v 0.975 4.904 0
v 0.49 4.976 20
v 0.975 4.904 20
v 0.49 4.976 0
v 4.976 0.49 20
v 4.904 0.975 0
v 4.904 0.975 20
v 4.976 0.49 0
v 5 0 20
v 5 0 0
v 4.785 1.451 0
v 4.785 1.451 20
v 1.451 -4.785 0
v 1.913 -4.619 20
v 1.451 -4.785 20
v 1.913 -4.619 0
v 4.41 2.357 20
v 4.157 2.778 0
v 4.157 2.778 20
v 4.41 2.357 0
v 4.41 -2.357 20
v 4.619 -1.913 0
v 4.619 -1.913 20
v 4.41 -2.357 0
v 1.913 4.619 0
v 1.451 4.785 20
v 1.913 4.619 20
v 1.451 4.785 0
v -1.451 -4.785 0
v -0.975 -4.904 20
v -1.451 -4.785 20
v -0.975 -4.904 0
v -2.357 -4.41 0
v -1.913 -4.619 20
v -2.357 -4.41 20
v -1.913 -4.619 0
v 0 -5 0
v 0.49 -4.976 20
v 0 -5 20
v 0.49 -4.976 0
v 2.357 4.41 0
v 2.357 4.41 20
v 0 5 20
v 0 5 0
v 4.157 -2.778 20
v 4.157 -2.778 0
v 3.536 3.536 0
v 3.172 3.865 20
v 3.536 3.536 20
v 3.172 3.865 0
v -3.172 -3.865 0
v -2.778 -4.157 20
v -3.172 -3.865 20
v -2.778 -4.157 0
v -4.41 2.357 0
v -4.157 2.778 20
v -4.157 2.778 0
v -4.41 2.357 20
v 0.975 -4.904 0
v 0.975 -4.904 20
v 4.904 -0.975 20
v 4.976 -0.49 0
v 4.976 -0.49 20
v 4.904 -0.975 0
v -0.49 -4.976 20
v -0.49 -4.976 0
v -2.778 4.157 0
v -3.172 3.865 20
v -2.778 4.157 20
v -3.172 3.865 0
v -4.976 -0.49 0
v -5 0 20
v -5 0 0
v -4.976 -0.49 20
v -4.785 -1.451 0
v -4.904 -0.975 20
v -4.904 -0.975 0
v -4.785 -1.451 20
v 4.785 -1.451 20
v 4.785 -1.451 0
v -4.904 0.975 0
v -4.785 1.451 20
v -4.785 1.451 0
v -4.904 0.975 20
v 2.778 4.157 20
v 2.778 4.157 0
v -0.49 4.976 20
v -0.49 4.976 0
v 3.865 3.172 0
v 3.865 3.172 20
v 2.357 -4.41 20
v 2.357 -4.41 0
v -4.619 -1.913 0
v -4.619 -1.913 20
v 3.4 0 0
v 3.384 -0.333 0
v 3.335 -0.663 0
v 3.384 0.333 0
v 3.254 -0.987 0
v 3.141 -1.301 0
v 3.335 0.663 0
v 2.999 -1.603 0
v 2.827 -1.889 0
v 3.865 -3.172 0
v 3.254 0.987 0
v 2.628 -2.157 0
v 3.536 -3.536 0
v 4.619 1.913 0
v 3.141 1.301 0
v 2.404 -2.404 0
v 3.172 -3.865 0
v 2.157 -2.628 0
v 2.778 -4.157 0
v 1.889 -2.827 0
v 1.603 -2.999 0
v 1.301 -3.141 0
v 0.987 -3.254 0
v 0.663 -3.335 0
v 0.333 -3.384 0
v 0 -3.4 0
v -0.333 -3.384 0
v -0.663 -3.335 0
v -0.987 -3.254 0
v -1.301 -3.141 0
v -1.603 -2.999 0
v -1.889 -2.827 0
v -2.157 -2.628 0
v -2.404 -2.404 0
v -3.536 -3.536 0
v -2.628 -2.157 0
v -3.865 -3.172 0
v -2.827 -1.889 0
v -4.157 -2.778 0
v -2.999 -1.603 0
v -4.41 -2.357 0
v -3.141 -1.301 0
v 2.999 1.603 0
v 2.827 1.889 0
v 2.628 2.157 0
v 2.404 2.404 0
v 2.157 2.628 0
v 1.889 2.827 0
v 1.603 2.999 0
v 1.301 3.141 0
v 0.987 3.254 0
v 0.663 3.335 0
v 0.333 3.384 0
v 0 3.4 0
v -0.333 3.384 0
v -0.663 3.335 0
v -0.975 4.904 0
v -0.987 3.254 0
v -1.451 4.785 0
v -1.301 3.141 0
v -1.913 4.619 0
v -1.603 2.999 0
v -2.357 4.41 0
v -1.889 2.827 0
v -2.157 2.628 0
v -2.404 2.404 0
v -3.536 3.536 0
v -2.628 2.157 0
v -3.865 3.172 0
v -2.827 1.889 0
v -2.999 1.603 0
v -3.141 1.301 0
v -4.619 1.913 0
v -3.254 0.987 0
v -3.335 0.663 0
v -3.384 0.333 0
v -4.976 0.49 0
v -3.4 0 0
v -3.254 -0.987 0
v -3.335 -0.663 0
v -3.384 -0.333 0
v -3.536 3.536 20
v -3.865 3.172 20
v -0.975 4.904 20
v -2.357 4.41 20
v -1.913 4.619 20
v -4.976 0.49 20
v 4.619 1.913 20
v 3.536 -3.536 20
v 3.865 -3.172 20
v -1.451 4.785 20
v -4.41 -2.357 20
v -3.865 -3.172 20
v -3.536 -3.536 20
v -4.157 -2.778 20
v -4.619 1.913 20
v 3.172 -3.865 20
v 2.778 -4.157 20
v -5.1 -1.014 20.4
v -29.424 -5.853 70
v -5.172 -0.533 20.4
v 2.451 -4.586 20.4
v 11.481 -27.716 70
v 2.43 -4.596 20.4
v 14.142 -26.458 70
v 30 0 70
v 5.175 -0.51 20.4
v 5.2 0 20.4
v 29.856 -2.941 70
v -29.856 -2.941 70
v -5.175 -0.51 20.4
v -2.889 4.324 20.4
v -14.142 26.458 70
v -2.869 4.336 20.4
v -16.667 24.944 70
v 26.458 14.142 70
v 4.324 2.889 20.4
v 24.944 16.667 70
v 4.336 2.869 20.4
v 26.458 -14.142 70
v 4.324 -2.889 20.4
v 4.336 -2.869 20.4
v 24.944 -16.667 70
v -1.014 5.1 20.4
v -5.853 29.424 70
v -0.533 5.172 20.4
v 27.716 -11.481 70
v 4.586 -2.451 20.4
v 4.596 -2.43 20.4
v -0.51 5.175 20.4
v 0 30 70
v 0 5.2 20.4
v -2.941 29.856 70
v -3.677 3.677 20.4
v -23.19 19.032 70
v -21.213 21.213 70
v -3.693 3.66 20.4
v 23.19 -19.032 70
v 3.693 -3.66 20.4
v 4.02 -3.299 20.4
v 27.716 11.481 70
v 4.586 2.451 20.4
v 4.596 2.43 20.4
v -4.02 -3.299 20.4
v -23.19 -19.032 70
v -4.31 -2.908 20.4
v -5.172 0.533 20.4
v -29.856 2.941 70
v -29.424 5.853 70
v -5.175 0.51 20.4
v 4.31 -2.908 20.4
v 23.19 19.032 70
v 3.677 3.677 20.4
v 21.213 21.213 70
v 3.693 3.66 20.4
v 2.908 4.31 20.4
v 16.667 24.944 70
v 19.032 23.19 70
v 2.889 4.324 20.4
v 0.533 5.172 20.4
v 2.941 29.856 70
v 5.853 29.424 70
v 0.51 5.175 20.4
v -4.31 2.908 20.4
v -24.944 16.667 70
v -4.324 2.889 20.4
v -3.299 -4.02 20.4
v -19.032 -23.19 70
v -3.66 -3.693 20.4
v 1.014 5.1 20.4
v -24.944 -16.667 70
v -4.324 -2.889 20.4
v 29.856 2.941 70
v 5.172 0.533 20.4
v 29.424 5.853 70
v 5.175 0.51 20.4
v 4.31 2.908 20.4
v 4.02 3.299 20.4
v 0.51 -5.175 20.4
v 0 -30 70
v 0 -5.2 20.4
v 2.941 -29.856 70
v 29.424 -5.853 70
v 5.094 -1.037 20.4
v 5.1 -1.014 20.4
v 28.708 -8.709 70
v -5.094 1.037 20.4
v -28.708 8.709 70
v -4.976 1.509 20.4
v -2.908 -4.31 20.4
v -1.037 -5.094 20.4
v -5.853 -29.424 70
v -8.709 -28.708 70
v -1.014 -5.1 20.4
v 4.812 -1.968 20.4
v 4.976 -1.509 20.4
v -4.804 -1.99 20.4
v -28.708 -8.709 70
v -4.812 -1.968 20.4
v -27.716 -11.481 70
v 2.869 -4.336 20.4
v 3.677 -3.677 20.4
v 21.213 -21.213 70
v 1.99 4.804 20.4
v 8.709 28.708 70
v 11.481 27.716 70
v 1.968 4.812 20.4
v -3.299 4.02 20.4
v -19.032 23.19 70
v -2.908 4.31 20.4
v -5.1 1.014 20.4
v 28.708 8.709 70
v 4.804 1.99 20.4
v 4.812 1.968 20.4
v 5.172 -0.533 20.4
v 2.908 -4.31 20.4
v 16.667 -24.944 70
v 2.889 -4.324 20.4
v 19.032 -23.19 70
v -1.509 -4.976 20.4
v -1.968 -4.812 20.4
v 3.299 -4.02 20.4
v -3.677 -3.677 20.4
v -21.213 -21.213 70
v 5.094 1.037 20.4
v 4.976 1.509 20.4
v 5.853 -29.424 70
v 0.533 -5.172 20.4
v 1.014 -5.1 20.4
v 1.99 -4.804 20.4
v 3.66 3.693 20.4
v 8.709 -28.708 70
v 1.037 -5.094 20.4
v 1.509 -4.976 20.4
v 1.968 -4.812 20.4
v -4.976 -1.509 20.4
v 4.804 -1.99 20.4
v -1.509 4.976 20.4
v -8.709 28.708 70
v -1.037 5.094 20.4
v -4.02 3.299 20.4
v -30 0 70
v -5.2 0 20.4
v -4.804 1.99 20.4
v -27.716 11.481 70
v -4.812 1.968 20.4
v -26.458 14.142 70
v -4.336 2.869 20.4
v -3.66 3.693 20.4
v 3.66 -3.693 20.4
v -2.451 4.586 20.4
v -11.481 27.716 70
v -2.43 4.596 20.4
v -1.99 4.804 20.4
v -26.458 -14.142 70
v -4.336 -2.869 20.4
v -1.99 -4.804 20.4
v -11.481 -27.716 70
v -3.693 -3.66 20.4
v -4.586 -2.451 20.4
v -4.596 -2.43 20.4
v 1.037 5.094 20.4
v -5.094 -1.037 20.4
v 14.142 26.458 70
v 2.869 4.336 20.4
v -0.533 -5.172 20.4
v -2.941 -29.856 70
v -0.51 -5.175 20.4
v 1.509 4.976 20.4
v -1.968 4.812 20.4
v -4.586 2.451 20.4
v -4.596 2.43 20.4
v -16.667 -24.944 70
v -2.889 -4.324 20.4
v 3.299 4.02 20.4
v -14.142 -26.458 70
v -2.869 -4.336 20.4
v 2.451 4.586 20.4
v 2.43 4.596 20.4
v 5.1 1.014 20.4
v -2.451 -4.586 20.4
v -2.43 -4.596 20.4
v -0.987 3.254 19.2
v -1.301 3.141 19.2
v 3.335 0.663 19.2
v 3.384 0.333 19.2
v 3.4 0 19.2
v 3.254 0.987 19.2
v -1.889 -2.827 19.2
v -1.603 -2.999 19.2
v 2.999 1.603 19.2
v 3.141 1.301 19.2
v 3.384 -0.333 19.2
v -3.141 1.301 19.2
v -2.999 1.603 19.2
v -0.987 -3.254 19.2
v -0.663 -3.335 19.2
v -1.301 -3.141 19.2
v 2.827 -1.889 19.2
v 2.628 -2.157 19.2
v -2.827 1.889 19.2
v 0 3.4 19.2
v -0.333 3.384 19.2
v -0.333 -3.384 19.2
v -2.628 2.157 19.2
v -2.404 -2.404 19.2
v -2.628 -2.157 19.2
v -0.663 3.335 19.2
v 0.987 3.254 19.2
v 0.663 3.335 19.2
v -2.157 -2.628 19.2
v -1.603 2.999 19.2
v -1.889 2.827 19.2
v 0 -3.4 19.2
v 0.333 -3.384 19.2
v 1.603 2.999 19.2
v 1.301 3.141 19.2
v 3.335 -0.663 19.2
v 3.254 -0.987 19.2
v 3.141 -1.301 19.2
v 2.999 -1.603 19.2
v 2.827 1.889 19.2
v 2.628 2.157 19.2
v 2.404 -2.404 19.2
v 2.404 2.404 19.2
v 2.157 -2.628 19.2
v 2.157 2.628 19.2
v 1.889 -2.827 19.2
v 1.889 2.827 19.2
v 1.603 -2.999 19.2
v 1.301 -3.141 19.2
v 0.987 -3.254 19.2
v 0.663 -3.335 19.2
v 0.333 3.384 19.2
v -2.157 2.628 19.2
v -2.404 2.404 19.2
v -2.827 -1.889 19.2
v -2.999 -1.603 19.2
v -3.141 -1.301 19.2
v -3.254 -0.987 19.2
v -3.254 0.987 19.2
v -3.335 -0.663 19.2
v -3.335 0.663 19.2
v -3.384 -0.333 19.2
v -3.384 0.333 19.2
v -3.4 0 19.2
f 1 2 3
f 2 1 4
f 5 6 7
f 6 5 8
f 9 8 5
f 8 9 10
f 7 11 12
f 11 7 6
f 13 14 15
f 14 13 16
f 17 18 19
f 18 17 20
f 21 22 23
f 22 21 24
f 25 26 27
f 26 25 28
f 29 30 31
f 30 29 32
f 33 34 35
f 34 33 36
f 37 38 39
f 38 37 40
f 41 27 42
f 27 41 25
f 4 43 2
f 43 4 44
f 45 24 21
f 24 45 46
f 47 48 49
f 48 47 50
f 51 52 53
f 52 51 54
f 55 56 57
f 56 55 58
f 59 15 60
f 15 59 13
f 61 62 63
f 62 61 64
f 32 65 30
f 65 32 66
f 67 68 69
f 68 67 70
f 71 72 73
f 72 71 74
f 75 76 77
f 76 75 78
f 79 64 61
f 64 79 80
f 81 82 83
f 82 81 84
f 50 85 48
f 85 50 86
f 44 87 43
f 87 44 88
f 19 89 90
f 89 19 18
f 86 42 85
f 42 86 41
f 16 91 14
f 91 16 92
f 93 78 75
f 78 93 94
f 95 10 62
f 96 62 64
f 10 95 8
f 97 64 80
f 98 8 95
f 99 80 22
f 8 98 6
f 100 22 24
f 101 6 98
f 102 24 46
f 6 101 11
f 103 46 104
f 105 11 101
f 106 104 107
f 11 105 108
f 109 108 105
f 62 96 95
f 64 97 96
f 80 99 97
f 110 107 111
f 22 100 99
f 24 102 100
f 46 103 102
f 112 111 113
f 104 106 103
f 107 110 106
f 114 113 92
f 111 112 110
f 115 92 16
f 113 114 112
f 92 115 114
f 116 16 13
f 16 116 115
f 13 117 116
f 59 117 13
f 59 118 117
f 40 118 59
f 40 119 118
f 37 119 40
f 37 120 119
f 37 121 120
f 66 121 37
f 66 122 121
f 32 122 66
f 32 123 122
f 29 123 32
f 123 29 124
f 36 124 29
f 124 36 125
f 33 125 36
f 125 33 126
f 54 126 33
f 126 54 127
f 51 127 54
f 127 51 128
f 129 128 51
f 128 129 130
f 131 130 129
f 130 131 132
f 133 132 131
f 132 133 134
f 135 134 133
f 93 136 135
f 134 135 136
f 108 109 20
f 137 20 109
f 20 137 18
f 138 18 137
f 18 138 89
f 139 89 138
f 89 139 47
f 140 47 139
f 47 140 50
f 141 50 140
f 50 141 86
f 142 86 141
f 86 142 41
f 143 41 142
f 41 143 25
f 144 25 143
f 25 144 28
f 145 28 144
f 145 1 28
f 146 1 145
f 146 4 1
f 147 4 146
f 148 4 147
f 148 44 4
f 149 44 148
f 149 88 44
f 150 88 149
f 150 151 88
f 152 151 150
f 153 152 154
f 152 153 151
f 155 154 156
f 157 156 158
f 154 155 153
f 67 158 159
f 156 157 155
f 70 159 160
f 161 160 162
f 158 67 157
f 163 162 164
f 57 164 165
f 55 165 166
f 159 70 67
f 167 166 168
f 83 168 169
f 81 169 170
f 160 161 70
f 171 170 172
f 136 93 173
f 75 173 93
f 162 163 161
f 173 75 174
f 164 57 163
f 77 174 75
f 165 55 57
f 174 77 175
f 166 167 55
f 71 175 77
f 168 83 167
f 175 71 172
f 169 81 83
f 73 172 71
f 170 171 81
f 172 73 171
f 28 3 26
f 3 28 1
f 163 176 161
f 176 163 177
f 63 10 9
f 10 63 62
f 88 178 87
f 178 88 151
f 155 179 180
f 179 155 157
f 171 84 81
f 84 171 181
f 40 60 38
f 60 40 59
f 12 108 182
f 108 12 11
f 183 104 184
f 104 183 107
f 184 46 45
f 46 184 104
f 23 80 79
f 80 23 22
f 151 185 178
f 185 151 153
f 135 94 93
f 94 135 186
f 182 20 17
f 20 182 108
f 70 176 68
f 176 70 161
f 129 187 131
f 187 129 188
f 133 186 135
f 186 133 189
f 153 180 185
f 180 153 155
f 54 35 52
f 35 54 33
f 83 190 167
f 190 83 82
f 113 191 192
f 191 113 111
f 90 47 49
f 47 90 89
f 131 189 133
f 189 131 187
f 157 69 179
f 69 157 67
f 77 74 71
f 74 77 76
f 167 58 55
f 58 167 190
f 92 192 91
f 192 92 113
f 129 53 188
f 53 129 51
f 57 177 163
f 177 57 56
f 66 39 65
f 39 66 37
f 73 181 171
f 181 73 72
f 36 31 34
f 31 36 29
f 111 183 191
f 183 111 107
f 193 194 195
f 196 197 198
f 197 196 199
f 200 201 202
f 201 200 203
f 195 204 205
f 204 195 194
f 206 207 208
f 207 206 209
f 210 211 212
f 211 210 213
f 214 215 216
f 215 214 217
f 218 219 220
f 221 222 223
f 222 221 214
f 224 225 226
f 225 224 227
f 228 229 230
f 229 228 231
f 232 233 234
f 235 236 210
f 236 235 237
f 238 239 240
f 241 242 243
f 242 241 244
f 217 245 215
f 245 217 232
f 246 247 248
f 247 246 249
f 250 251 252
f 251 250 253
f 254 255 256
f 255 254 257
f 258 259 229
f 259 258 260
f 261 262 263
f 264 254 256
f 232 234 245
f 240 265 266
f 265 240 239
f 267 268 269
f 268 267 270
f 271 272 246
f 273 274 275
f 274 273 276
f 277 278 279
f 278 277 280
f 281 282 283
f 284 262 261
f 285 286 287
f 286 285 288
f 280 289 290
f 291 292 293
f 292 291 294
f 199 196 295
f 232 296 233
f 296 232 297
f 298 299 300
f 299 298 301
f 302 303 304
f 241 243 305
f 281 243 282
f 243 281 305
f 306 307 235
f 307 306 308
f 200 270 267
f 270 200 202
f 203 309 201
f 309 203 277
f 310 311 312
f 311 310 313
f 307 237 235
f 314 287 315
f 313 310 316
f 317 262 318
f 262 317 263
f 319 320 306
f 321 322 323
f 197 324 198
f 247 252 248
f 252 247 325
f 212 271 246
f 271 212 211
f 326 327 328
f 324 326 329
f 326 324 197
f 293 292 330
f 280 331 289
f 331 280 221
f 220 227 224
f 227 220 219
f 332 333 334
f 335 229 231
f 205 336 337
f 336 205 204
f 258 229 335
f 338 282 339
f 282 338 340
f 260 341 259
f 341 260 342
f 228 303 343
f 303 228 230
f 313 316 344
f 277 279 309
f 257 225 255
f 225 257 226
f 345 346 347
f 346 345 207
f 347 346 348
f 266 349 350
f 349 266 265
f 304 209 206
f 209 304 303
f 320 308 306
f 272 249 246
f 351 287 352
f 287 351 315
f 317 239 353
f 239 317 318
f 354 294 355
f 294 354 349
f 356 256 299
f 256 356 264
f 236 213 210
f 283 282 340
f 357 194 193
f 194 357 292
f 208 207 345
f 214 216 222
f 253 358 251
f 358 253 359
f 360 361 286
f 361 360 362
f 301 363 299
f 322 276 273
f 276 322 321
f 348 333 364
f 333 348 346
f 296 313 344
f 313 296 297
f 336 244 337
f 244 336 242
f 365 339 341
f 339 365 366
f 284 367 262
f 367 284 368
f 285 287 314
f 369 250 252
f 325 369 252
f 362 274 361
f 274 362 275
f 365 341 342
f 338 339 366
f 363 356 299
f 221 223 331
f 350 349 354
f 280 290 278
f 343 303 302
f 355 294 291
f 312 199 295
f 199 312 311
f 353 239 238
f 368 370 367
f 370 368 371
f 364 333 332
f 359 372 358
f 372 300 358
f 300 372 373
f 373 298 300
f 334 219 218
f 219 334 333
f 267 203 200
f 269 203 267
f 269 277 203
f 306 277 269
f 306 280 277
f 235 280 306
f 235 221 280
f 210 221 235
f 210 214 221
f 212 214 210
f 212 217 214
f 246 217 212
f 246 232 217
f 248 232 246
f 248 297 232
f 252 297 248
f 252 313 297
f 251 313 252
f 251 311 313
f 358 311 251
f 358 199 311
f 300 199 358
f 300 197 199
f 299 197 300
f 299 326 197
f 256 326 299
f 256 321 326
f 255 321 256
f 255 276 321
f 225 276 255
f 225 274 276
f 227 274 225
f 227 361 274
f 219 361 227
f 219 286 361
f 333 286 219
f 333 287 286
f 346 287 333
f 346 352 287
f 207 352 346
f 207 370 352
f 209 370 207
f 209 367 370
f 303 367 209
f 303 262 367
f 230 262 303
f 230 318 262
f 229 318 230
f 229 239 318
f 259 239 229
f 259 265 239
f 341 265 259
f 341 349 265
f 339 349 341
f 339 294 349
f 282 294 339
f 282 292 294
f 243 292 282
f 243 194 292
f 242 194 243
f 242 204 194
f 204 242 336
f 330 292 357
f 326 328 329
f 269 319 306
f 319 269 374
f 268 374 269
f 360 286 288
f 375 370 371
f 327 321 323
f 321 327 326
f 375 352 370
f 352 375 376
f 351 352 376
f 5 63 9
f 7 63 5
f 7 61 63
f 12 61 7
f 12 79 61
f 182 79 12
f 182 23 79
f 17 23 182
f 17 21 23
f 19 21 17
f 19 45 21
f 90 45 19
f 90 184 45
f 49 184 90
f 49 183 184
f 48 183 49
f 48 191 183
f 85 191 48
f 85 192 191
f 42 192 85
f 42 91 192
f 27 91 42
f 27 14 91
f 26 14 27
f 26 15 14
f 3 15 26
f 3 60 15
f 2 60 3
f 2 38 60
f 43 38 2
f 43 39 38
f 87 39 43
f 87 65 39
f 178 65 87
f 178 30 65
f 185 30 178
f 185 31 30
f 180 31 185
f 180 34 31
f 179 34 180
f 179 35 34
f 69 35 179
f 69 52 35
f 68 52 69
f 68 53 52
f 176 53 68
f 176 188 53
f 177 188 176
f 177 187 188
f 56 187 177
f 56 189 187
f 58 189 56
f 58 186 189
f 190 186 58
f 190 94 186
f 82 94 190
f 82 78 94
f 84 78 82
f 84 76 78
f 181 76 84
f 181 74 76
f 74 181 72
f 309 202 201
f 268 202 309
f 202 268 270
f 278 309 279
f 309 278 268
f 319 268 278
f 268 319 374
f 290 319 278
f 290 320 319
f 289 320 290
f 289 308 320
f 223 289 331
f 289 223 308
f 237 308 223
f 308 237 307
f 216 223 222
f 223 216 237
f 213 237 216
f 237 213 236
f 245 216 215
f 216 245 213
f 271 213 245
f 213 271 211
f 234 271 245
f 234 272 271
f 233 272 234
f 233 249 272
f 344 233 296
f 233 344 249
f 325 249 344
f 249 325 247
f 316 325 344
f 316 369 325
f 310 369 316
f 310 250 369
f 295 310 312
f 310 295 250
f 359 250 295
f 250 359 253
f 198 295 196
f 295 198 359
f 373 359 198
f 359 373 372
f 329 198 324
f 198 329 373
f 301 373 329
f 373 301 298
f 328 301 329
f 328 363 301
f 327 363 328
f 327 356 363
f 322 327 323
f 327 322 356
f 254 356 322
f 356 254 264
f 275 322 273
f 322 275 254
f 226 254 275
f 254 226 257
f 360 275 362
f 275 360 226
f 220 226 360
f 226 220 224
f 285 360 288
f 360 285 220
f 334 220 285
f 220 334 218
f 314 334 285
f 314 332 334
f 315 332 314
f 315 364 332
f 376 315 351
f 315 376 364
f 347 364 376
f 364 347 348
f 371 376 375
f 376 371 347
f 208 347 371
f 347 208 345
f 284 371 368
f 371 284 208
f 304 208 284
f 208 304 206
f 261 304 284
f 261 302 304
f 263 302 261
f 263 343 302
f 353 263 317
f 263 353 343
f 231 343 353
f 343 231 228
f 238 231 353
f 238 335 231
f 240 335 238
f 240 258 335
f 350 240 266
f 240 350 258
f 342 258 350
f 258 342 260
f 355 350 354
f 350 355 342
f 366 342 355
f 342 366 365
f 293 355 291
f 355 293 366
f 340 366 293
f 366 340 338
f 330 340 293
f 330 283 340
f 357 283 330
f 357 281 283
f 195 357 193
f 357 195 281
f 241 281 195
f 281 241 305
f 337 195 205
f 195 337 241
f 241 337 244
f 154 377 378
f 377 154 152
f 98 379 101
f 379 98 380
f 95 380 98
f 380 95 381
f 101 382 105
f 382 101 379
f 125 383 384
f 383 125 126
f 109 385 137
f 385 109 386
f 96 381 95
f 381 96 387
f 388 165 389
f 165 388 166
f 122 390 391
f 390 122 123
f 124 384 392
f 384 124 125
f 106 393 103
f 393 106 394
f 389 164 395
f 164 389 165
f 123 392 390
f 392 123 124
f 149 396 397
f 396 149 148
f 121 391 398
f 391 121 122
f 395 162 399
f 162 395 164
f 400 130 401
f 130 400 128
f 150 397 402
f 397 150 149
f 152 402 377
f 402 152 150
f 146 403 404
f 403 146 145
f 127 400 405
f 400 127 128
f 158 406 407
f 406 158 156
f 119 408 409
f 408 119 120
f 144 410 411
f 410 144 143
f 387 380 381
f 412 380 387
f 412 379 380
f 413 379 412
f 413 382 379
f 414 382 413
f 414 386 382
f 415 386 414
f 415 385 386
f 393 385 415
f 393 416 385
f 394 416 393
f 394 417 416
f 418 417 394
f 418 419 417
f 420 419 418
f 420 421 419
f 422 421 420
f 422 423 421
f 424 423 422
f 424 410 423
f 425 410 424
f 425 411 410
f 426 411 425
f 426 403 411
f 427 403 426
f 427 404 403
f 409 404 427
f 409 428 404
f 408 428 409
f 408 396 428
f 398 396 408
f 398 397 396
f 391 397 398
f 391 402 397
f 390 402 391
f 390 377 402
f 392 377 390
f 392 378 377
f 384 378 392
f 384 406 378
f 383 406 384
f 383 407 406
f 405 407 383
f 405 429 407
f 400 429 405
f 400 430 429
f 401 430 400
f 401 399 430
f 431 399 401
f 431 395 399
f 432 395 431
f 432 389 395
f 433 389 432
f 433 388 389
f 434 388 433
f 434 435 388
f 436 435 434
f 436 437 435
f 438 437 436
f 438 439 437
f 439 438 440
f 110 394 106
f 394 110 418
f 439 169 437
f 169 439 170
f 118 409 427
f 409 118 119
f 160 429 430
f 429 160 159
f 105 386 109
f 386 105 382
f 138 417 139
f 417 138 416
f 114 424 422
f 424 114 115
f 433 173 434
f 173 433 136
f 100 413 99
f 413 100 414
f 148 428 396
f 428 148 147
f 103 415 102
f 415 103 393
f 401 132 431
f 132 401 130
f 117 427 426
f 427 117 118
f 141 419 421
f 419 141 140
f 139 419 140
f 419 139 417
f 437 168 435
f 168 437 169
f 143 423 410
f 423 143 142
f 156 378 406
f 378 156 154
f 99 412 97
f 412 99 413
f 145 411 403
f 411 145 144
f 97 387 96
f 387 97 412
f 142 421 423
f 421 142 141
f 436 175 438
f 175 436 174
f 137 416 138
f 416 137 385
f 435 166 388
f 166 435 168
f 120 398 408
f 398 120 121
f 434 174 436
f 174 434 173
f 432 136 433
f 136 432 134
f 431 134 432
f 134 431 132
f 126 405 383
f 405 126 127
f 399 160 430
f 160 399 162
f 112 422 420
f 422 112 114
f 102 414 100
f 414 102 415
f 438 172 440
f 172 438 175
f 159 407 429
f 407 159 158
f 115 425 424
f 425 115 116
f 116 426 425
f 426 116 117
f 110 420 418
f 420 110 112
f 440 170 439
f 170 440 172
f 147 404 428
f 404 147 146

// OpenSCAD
// Lab funnel - printed upright, open at top and bottom
// Units: mm

$fn = 64;

// --- Dimensions ---
spout_od      = 10;   // spout outer diameter
spout_id      = spout_od - 2 * 1.6;  // spout bore (6.8)
spout_h       = 20;   // spout height (z = 0 to 20)
cone_top_d    = 10;   // cone diameter at z = 20
cone_rim_d    = 60;   // cone rim diameter at z = 50
cone_h        = cone_rim_d - cone_top_d;  // cone height (30)
wall          = 1.6;  // wall thickness

total_h = spout_h + cone_h;  // 50

difference() {
    union() {
        // Spout
        cylinder(d = spout_od, h = spout_h);
        // Cone (from top diameter down to rim)
        translate([0, 0, spout_h])
            cylinder(d1 = cone_top_d, d2 = cone_rim_d, h = cone_h);
    }
    // Through-bore: spout bore up to cone start, then 60 mm hole at rim
    translate([0, 0, spout_h])
        cylinder(d = cone_rim_d + 0.8, h = 0.4);  // thin wall above rim
    cylinder(d = spout_id, h = spout_h - 0.8);   // bore ends below cone
}
